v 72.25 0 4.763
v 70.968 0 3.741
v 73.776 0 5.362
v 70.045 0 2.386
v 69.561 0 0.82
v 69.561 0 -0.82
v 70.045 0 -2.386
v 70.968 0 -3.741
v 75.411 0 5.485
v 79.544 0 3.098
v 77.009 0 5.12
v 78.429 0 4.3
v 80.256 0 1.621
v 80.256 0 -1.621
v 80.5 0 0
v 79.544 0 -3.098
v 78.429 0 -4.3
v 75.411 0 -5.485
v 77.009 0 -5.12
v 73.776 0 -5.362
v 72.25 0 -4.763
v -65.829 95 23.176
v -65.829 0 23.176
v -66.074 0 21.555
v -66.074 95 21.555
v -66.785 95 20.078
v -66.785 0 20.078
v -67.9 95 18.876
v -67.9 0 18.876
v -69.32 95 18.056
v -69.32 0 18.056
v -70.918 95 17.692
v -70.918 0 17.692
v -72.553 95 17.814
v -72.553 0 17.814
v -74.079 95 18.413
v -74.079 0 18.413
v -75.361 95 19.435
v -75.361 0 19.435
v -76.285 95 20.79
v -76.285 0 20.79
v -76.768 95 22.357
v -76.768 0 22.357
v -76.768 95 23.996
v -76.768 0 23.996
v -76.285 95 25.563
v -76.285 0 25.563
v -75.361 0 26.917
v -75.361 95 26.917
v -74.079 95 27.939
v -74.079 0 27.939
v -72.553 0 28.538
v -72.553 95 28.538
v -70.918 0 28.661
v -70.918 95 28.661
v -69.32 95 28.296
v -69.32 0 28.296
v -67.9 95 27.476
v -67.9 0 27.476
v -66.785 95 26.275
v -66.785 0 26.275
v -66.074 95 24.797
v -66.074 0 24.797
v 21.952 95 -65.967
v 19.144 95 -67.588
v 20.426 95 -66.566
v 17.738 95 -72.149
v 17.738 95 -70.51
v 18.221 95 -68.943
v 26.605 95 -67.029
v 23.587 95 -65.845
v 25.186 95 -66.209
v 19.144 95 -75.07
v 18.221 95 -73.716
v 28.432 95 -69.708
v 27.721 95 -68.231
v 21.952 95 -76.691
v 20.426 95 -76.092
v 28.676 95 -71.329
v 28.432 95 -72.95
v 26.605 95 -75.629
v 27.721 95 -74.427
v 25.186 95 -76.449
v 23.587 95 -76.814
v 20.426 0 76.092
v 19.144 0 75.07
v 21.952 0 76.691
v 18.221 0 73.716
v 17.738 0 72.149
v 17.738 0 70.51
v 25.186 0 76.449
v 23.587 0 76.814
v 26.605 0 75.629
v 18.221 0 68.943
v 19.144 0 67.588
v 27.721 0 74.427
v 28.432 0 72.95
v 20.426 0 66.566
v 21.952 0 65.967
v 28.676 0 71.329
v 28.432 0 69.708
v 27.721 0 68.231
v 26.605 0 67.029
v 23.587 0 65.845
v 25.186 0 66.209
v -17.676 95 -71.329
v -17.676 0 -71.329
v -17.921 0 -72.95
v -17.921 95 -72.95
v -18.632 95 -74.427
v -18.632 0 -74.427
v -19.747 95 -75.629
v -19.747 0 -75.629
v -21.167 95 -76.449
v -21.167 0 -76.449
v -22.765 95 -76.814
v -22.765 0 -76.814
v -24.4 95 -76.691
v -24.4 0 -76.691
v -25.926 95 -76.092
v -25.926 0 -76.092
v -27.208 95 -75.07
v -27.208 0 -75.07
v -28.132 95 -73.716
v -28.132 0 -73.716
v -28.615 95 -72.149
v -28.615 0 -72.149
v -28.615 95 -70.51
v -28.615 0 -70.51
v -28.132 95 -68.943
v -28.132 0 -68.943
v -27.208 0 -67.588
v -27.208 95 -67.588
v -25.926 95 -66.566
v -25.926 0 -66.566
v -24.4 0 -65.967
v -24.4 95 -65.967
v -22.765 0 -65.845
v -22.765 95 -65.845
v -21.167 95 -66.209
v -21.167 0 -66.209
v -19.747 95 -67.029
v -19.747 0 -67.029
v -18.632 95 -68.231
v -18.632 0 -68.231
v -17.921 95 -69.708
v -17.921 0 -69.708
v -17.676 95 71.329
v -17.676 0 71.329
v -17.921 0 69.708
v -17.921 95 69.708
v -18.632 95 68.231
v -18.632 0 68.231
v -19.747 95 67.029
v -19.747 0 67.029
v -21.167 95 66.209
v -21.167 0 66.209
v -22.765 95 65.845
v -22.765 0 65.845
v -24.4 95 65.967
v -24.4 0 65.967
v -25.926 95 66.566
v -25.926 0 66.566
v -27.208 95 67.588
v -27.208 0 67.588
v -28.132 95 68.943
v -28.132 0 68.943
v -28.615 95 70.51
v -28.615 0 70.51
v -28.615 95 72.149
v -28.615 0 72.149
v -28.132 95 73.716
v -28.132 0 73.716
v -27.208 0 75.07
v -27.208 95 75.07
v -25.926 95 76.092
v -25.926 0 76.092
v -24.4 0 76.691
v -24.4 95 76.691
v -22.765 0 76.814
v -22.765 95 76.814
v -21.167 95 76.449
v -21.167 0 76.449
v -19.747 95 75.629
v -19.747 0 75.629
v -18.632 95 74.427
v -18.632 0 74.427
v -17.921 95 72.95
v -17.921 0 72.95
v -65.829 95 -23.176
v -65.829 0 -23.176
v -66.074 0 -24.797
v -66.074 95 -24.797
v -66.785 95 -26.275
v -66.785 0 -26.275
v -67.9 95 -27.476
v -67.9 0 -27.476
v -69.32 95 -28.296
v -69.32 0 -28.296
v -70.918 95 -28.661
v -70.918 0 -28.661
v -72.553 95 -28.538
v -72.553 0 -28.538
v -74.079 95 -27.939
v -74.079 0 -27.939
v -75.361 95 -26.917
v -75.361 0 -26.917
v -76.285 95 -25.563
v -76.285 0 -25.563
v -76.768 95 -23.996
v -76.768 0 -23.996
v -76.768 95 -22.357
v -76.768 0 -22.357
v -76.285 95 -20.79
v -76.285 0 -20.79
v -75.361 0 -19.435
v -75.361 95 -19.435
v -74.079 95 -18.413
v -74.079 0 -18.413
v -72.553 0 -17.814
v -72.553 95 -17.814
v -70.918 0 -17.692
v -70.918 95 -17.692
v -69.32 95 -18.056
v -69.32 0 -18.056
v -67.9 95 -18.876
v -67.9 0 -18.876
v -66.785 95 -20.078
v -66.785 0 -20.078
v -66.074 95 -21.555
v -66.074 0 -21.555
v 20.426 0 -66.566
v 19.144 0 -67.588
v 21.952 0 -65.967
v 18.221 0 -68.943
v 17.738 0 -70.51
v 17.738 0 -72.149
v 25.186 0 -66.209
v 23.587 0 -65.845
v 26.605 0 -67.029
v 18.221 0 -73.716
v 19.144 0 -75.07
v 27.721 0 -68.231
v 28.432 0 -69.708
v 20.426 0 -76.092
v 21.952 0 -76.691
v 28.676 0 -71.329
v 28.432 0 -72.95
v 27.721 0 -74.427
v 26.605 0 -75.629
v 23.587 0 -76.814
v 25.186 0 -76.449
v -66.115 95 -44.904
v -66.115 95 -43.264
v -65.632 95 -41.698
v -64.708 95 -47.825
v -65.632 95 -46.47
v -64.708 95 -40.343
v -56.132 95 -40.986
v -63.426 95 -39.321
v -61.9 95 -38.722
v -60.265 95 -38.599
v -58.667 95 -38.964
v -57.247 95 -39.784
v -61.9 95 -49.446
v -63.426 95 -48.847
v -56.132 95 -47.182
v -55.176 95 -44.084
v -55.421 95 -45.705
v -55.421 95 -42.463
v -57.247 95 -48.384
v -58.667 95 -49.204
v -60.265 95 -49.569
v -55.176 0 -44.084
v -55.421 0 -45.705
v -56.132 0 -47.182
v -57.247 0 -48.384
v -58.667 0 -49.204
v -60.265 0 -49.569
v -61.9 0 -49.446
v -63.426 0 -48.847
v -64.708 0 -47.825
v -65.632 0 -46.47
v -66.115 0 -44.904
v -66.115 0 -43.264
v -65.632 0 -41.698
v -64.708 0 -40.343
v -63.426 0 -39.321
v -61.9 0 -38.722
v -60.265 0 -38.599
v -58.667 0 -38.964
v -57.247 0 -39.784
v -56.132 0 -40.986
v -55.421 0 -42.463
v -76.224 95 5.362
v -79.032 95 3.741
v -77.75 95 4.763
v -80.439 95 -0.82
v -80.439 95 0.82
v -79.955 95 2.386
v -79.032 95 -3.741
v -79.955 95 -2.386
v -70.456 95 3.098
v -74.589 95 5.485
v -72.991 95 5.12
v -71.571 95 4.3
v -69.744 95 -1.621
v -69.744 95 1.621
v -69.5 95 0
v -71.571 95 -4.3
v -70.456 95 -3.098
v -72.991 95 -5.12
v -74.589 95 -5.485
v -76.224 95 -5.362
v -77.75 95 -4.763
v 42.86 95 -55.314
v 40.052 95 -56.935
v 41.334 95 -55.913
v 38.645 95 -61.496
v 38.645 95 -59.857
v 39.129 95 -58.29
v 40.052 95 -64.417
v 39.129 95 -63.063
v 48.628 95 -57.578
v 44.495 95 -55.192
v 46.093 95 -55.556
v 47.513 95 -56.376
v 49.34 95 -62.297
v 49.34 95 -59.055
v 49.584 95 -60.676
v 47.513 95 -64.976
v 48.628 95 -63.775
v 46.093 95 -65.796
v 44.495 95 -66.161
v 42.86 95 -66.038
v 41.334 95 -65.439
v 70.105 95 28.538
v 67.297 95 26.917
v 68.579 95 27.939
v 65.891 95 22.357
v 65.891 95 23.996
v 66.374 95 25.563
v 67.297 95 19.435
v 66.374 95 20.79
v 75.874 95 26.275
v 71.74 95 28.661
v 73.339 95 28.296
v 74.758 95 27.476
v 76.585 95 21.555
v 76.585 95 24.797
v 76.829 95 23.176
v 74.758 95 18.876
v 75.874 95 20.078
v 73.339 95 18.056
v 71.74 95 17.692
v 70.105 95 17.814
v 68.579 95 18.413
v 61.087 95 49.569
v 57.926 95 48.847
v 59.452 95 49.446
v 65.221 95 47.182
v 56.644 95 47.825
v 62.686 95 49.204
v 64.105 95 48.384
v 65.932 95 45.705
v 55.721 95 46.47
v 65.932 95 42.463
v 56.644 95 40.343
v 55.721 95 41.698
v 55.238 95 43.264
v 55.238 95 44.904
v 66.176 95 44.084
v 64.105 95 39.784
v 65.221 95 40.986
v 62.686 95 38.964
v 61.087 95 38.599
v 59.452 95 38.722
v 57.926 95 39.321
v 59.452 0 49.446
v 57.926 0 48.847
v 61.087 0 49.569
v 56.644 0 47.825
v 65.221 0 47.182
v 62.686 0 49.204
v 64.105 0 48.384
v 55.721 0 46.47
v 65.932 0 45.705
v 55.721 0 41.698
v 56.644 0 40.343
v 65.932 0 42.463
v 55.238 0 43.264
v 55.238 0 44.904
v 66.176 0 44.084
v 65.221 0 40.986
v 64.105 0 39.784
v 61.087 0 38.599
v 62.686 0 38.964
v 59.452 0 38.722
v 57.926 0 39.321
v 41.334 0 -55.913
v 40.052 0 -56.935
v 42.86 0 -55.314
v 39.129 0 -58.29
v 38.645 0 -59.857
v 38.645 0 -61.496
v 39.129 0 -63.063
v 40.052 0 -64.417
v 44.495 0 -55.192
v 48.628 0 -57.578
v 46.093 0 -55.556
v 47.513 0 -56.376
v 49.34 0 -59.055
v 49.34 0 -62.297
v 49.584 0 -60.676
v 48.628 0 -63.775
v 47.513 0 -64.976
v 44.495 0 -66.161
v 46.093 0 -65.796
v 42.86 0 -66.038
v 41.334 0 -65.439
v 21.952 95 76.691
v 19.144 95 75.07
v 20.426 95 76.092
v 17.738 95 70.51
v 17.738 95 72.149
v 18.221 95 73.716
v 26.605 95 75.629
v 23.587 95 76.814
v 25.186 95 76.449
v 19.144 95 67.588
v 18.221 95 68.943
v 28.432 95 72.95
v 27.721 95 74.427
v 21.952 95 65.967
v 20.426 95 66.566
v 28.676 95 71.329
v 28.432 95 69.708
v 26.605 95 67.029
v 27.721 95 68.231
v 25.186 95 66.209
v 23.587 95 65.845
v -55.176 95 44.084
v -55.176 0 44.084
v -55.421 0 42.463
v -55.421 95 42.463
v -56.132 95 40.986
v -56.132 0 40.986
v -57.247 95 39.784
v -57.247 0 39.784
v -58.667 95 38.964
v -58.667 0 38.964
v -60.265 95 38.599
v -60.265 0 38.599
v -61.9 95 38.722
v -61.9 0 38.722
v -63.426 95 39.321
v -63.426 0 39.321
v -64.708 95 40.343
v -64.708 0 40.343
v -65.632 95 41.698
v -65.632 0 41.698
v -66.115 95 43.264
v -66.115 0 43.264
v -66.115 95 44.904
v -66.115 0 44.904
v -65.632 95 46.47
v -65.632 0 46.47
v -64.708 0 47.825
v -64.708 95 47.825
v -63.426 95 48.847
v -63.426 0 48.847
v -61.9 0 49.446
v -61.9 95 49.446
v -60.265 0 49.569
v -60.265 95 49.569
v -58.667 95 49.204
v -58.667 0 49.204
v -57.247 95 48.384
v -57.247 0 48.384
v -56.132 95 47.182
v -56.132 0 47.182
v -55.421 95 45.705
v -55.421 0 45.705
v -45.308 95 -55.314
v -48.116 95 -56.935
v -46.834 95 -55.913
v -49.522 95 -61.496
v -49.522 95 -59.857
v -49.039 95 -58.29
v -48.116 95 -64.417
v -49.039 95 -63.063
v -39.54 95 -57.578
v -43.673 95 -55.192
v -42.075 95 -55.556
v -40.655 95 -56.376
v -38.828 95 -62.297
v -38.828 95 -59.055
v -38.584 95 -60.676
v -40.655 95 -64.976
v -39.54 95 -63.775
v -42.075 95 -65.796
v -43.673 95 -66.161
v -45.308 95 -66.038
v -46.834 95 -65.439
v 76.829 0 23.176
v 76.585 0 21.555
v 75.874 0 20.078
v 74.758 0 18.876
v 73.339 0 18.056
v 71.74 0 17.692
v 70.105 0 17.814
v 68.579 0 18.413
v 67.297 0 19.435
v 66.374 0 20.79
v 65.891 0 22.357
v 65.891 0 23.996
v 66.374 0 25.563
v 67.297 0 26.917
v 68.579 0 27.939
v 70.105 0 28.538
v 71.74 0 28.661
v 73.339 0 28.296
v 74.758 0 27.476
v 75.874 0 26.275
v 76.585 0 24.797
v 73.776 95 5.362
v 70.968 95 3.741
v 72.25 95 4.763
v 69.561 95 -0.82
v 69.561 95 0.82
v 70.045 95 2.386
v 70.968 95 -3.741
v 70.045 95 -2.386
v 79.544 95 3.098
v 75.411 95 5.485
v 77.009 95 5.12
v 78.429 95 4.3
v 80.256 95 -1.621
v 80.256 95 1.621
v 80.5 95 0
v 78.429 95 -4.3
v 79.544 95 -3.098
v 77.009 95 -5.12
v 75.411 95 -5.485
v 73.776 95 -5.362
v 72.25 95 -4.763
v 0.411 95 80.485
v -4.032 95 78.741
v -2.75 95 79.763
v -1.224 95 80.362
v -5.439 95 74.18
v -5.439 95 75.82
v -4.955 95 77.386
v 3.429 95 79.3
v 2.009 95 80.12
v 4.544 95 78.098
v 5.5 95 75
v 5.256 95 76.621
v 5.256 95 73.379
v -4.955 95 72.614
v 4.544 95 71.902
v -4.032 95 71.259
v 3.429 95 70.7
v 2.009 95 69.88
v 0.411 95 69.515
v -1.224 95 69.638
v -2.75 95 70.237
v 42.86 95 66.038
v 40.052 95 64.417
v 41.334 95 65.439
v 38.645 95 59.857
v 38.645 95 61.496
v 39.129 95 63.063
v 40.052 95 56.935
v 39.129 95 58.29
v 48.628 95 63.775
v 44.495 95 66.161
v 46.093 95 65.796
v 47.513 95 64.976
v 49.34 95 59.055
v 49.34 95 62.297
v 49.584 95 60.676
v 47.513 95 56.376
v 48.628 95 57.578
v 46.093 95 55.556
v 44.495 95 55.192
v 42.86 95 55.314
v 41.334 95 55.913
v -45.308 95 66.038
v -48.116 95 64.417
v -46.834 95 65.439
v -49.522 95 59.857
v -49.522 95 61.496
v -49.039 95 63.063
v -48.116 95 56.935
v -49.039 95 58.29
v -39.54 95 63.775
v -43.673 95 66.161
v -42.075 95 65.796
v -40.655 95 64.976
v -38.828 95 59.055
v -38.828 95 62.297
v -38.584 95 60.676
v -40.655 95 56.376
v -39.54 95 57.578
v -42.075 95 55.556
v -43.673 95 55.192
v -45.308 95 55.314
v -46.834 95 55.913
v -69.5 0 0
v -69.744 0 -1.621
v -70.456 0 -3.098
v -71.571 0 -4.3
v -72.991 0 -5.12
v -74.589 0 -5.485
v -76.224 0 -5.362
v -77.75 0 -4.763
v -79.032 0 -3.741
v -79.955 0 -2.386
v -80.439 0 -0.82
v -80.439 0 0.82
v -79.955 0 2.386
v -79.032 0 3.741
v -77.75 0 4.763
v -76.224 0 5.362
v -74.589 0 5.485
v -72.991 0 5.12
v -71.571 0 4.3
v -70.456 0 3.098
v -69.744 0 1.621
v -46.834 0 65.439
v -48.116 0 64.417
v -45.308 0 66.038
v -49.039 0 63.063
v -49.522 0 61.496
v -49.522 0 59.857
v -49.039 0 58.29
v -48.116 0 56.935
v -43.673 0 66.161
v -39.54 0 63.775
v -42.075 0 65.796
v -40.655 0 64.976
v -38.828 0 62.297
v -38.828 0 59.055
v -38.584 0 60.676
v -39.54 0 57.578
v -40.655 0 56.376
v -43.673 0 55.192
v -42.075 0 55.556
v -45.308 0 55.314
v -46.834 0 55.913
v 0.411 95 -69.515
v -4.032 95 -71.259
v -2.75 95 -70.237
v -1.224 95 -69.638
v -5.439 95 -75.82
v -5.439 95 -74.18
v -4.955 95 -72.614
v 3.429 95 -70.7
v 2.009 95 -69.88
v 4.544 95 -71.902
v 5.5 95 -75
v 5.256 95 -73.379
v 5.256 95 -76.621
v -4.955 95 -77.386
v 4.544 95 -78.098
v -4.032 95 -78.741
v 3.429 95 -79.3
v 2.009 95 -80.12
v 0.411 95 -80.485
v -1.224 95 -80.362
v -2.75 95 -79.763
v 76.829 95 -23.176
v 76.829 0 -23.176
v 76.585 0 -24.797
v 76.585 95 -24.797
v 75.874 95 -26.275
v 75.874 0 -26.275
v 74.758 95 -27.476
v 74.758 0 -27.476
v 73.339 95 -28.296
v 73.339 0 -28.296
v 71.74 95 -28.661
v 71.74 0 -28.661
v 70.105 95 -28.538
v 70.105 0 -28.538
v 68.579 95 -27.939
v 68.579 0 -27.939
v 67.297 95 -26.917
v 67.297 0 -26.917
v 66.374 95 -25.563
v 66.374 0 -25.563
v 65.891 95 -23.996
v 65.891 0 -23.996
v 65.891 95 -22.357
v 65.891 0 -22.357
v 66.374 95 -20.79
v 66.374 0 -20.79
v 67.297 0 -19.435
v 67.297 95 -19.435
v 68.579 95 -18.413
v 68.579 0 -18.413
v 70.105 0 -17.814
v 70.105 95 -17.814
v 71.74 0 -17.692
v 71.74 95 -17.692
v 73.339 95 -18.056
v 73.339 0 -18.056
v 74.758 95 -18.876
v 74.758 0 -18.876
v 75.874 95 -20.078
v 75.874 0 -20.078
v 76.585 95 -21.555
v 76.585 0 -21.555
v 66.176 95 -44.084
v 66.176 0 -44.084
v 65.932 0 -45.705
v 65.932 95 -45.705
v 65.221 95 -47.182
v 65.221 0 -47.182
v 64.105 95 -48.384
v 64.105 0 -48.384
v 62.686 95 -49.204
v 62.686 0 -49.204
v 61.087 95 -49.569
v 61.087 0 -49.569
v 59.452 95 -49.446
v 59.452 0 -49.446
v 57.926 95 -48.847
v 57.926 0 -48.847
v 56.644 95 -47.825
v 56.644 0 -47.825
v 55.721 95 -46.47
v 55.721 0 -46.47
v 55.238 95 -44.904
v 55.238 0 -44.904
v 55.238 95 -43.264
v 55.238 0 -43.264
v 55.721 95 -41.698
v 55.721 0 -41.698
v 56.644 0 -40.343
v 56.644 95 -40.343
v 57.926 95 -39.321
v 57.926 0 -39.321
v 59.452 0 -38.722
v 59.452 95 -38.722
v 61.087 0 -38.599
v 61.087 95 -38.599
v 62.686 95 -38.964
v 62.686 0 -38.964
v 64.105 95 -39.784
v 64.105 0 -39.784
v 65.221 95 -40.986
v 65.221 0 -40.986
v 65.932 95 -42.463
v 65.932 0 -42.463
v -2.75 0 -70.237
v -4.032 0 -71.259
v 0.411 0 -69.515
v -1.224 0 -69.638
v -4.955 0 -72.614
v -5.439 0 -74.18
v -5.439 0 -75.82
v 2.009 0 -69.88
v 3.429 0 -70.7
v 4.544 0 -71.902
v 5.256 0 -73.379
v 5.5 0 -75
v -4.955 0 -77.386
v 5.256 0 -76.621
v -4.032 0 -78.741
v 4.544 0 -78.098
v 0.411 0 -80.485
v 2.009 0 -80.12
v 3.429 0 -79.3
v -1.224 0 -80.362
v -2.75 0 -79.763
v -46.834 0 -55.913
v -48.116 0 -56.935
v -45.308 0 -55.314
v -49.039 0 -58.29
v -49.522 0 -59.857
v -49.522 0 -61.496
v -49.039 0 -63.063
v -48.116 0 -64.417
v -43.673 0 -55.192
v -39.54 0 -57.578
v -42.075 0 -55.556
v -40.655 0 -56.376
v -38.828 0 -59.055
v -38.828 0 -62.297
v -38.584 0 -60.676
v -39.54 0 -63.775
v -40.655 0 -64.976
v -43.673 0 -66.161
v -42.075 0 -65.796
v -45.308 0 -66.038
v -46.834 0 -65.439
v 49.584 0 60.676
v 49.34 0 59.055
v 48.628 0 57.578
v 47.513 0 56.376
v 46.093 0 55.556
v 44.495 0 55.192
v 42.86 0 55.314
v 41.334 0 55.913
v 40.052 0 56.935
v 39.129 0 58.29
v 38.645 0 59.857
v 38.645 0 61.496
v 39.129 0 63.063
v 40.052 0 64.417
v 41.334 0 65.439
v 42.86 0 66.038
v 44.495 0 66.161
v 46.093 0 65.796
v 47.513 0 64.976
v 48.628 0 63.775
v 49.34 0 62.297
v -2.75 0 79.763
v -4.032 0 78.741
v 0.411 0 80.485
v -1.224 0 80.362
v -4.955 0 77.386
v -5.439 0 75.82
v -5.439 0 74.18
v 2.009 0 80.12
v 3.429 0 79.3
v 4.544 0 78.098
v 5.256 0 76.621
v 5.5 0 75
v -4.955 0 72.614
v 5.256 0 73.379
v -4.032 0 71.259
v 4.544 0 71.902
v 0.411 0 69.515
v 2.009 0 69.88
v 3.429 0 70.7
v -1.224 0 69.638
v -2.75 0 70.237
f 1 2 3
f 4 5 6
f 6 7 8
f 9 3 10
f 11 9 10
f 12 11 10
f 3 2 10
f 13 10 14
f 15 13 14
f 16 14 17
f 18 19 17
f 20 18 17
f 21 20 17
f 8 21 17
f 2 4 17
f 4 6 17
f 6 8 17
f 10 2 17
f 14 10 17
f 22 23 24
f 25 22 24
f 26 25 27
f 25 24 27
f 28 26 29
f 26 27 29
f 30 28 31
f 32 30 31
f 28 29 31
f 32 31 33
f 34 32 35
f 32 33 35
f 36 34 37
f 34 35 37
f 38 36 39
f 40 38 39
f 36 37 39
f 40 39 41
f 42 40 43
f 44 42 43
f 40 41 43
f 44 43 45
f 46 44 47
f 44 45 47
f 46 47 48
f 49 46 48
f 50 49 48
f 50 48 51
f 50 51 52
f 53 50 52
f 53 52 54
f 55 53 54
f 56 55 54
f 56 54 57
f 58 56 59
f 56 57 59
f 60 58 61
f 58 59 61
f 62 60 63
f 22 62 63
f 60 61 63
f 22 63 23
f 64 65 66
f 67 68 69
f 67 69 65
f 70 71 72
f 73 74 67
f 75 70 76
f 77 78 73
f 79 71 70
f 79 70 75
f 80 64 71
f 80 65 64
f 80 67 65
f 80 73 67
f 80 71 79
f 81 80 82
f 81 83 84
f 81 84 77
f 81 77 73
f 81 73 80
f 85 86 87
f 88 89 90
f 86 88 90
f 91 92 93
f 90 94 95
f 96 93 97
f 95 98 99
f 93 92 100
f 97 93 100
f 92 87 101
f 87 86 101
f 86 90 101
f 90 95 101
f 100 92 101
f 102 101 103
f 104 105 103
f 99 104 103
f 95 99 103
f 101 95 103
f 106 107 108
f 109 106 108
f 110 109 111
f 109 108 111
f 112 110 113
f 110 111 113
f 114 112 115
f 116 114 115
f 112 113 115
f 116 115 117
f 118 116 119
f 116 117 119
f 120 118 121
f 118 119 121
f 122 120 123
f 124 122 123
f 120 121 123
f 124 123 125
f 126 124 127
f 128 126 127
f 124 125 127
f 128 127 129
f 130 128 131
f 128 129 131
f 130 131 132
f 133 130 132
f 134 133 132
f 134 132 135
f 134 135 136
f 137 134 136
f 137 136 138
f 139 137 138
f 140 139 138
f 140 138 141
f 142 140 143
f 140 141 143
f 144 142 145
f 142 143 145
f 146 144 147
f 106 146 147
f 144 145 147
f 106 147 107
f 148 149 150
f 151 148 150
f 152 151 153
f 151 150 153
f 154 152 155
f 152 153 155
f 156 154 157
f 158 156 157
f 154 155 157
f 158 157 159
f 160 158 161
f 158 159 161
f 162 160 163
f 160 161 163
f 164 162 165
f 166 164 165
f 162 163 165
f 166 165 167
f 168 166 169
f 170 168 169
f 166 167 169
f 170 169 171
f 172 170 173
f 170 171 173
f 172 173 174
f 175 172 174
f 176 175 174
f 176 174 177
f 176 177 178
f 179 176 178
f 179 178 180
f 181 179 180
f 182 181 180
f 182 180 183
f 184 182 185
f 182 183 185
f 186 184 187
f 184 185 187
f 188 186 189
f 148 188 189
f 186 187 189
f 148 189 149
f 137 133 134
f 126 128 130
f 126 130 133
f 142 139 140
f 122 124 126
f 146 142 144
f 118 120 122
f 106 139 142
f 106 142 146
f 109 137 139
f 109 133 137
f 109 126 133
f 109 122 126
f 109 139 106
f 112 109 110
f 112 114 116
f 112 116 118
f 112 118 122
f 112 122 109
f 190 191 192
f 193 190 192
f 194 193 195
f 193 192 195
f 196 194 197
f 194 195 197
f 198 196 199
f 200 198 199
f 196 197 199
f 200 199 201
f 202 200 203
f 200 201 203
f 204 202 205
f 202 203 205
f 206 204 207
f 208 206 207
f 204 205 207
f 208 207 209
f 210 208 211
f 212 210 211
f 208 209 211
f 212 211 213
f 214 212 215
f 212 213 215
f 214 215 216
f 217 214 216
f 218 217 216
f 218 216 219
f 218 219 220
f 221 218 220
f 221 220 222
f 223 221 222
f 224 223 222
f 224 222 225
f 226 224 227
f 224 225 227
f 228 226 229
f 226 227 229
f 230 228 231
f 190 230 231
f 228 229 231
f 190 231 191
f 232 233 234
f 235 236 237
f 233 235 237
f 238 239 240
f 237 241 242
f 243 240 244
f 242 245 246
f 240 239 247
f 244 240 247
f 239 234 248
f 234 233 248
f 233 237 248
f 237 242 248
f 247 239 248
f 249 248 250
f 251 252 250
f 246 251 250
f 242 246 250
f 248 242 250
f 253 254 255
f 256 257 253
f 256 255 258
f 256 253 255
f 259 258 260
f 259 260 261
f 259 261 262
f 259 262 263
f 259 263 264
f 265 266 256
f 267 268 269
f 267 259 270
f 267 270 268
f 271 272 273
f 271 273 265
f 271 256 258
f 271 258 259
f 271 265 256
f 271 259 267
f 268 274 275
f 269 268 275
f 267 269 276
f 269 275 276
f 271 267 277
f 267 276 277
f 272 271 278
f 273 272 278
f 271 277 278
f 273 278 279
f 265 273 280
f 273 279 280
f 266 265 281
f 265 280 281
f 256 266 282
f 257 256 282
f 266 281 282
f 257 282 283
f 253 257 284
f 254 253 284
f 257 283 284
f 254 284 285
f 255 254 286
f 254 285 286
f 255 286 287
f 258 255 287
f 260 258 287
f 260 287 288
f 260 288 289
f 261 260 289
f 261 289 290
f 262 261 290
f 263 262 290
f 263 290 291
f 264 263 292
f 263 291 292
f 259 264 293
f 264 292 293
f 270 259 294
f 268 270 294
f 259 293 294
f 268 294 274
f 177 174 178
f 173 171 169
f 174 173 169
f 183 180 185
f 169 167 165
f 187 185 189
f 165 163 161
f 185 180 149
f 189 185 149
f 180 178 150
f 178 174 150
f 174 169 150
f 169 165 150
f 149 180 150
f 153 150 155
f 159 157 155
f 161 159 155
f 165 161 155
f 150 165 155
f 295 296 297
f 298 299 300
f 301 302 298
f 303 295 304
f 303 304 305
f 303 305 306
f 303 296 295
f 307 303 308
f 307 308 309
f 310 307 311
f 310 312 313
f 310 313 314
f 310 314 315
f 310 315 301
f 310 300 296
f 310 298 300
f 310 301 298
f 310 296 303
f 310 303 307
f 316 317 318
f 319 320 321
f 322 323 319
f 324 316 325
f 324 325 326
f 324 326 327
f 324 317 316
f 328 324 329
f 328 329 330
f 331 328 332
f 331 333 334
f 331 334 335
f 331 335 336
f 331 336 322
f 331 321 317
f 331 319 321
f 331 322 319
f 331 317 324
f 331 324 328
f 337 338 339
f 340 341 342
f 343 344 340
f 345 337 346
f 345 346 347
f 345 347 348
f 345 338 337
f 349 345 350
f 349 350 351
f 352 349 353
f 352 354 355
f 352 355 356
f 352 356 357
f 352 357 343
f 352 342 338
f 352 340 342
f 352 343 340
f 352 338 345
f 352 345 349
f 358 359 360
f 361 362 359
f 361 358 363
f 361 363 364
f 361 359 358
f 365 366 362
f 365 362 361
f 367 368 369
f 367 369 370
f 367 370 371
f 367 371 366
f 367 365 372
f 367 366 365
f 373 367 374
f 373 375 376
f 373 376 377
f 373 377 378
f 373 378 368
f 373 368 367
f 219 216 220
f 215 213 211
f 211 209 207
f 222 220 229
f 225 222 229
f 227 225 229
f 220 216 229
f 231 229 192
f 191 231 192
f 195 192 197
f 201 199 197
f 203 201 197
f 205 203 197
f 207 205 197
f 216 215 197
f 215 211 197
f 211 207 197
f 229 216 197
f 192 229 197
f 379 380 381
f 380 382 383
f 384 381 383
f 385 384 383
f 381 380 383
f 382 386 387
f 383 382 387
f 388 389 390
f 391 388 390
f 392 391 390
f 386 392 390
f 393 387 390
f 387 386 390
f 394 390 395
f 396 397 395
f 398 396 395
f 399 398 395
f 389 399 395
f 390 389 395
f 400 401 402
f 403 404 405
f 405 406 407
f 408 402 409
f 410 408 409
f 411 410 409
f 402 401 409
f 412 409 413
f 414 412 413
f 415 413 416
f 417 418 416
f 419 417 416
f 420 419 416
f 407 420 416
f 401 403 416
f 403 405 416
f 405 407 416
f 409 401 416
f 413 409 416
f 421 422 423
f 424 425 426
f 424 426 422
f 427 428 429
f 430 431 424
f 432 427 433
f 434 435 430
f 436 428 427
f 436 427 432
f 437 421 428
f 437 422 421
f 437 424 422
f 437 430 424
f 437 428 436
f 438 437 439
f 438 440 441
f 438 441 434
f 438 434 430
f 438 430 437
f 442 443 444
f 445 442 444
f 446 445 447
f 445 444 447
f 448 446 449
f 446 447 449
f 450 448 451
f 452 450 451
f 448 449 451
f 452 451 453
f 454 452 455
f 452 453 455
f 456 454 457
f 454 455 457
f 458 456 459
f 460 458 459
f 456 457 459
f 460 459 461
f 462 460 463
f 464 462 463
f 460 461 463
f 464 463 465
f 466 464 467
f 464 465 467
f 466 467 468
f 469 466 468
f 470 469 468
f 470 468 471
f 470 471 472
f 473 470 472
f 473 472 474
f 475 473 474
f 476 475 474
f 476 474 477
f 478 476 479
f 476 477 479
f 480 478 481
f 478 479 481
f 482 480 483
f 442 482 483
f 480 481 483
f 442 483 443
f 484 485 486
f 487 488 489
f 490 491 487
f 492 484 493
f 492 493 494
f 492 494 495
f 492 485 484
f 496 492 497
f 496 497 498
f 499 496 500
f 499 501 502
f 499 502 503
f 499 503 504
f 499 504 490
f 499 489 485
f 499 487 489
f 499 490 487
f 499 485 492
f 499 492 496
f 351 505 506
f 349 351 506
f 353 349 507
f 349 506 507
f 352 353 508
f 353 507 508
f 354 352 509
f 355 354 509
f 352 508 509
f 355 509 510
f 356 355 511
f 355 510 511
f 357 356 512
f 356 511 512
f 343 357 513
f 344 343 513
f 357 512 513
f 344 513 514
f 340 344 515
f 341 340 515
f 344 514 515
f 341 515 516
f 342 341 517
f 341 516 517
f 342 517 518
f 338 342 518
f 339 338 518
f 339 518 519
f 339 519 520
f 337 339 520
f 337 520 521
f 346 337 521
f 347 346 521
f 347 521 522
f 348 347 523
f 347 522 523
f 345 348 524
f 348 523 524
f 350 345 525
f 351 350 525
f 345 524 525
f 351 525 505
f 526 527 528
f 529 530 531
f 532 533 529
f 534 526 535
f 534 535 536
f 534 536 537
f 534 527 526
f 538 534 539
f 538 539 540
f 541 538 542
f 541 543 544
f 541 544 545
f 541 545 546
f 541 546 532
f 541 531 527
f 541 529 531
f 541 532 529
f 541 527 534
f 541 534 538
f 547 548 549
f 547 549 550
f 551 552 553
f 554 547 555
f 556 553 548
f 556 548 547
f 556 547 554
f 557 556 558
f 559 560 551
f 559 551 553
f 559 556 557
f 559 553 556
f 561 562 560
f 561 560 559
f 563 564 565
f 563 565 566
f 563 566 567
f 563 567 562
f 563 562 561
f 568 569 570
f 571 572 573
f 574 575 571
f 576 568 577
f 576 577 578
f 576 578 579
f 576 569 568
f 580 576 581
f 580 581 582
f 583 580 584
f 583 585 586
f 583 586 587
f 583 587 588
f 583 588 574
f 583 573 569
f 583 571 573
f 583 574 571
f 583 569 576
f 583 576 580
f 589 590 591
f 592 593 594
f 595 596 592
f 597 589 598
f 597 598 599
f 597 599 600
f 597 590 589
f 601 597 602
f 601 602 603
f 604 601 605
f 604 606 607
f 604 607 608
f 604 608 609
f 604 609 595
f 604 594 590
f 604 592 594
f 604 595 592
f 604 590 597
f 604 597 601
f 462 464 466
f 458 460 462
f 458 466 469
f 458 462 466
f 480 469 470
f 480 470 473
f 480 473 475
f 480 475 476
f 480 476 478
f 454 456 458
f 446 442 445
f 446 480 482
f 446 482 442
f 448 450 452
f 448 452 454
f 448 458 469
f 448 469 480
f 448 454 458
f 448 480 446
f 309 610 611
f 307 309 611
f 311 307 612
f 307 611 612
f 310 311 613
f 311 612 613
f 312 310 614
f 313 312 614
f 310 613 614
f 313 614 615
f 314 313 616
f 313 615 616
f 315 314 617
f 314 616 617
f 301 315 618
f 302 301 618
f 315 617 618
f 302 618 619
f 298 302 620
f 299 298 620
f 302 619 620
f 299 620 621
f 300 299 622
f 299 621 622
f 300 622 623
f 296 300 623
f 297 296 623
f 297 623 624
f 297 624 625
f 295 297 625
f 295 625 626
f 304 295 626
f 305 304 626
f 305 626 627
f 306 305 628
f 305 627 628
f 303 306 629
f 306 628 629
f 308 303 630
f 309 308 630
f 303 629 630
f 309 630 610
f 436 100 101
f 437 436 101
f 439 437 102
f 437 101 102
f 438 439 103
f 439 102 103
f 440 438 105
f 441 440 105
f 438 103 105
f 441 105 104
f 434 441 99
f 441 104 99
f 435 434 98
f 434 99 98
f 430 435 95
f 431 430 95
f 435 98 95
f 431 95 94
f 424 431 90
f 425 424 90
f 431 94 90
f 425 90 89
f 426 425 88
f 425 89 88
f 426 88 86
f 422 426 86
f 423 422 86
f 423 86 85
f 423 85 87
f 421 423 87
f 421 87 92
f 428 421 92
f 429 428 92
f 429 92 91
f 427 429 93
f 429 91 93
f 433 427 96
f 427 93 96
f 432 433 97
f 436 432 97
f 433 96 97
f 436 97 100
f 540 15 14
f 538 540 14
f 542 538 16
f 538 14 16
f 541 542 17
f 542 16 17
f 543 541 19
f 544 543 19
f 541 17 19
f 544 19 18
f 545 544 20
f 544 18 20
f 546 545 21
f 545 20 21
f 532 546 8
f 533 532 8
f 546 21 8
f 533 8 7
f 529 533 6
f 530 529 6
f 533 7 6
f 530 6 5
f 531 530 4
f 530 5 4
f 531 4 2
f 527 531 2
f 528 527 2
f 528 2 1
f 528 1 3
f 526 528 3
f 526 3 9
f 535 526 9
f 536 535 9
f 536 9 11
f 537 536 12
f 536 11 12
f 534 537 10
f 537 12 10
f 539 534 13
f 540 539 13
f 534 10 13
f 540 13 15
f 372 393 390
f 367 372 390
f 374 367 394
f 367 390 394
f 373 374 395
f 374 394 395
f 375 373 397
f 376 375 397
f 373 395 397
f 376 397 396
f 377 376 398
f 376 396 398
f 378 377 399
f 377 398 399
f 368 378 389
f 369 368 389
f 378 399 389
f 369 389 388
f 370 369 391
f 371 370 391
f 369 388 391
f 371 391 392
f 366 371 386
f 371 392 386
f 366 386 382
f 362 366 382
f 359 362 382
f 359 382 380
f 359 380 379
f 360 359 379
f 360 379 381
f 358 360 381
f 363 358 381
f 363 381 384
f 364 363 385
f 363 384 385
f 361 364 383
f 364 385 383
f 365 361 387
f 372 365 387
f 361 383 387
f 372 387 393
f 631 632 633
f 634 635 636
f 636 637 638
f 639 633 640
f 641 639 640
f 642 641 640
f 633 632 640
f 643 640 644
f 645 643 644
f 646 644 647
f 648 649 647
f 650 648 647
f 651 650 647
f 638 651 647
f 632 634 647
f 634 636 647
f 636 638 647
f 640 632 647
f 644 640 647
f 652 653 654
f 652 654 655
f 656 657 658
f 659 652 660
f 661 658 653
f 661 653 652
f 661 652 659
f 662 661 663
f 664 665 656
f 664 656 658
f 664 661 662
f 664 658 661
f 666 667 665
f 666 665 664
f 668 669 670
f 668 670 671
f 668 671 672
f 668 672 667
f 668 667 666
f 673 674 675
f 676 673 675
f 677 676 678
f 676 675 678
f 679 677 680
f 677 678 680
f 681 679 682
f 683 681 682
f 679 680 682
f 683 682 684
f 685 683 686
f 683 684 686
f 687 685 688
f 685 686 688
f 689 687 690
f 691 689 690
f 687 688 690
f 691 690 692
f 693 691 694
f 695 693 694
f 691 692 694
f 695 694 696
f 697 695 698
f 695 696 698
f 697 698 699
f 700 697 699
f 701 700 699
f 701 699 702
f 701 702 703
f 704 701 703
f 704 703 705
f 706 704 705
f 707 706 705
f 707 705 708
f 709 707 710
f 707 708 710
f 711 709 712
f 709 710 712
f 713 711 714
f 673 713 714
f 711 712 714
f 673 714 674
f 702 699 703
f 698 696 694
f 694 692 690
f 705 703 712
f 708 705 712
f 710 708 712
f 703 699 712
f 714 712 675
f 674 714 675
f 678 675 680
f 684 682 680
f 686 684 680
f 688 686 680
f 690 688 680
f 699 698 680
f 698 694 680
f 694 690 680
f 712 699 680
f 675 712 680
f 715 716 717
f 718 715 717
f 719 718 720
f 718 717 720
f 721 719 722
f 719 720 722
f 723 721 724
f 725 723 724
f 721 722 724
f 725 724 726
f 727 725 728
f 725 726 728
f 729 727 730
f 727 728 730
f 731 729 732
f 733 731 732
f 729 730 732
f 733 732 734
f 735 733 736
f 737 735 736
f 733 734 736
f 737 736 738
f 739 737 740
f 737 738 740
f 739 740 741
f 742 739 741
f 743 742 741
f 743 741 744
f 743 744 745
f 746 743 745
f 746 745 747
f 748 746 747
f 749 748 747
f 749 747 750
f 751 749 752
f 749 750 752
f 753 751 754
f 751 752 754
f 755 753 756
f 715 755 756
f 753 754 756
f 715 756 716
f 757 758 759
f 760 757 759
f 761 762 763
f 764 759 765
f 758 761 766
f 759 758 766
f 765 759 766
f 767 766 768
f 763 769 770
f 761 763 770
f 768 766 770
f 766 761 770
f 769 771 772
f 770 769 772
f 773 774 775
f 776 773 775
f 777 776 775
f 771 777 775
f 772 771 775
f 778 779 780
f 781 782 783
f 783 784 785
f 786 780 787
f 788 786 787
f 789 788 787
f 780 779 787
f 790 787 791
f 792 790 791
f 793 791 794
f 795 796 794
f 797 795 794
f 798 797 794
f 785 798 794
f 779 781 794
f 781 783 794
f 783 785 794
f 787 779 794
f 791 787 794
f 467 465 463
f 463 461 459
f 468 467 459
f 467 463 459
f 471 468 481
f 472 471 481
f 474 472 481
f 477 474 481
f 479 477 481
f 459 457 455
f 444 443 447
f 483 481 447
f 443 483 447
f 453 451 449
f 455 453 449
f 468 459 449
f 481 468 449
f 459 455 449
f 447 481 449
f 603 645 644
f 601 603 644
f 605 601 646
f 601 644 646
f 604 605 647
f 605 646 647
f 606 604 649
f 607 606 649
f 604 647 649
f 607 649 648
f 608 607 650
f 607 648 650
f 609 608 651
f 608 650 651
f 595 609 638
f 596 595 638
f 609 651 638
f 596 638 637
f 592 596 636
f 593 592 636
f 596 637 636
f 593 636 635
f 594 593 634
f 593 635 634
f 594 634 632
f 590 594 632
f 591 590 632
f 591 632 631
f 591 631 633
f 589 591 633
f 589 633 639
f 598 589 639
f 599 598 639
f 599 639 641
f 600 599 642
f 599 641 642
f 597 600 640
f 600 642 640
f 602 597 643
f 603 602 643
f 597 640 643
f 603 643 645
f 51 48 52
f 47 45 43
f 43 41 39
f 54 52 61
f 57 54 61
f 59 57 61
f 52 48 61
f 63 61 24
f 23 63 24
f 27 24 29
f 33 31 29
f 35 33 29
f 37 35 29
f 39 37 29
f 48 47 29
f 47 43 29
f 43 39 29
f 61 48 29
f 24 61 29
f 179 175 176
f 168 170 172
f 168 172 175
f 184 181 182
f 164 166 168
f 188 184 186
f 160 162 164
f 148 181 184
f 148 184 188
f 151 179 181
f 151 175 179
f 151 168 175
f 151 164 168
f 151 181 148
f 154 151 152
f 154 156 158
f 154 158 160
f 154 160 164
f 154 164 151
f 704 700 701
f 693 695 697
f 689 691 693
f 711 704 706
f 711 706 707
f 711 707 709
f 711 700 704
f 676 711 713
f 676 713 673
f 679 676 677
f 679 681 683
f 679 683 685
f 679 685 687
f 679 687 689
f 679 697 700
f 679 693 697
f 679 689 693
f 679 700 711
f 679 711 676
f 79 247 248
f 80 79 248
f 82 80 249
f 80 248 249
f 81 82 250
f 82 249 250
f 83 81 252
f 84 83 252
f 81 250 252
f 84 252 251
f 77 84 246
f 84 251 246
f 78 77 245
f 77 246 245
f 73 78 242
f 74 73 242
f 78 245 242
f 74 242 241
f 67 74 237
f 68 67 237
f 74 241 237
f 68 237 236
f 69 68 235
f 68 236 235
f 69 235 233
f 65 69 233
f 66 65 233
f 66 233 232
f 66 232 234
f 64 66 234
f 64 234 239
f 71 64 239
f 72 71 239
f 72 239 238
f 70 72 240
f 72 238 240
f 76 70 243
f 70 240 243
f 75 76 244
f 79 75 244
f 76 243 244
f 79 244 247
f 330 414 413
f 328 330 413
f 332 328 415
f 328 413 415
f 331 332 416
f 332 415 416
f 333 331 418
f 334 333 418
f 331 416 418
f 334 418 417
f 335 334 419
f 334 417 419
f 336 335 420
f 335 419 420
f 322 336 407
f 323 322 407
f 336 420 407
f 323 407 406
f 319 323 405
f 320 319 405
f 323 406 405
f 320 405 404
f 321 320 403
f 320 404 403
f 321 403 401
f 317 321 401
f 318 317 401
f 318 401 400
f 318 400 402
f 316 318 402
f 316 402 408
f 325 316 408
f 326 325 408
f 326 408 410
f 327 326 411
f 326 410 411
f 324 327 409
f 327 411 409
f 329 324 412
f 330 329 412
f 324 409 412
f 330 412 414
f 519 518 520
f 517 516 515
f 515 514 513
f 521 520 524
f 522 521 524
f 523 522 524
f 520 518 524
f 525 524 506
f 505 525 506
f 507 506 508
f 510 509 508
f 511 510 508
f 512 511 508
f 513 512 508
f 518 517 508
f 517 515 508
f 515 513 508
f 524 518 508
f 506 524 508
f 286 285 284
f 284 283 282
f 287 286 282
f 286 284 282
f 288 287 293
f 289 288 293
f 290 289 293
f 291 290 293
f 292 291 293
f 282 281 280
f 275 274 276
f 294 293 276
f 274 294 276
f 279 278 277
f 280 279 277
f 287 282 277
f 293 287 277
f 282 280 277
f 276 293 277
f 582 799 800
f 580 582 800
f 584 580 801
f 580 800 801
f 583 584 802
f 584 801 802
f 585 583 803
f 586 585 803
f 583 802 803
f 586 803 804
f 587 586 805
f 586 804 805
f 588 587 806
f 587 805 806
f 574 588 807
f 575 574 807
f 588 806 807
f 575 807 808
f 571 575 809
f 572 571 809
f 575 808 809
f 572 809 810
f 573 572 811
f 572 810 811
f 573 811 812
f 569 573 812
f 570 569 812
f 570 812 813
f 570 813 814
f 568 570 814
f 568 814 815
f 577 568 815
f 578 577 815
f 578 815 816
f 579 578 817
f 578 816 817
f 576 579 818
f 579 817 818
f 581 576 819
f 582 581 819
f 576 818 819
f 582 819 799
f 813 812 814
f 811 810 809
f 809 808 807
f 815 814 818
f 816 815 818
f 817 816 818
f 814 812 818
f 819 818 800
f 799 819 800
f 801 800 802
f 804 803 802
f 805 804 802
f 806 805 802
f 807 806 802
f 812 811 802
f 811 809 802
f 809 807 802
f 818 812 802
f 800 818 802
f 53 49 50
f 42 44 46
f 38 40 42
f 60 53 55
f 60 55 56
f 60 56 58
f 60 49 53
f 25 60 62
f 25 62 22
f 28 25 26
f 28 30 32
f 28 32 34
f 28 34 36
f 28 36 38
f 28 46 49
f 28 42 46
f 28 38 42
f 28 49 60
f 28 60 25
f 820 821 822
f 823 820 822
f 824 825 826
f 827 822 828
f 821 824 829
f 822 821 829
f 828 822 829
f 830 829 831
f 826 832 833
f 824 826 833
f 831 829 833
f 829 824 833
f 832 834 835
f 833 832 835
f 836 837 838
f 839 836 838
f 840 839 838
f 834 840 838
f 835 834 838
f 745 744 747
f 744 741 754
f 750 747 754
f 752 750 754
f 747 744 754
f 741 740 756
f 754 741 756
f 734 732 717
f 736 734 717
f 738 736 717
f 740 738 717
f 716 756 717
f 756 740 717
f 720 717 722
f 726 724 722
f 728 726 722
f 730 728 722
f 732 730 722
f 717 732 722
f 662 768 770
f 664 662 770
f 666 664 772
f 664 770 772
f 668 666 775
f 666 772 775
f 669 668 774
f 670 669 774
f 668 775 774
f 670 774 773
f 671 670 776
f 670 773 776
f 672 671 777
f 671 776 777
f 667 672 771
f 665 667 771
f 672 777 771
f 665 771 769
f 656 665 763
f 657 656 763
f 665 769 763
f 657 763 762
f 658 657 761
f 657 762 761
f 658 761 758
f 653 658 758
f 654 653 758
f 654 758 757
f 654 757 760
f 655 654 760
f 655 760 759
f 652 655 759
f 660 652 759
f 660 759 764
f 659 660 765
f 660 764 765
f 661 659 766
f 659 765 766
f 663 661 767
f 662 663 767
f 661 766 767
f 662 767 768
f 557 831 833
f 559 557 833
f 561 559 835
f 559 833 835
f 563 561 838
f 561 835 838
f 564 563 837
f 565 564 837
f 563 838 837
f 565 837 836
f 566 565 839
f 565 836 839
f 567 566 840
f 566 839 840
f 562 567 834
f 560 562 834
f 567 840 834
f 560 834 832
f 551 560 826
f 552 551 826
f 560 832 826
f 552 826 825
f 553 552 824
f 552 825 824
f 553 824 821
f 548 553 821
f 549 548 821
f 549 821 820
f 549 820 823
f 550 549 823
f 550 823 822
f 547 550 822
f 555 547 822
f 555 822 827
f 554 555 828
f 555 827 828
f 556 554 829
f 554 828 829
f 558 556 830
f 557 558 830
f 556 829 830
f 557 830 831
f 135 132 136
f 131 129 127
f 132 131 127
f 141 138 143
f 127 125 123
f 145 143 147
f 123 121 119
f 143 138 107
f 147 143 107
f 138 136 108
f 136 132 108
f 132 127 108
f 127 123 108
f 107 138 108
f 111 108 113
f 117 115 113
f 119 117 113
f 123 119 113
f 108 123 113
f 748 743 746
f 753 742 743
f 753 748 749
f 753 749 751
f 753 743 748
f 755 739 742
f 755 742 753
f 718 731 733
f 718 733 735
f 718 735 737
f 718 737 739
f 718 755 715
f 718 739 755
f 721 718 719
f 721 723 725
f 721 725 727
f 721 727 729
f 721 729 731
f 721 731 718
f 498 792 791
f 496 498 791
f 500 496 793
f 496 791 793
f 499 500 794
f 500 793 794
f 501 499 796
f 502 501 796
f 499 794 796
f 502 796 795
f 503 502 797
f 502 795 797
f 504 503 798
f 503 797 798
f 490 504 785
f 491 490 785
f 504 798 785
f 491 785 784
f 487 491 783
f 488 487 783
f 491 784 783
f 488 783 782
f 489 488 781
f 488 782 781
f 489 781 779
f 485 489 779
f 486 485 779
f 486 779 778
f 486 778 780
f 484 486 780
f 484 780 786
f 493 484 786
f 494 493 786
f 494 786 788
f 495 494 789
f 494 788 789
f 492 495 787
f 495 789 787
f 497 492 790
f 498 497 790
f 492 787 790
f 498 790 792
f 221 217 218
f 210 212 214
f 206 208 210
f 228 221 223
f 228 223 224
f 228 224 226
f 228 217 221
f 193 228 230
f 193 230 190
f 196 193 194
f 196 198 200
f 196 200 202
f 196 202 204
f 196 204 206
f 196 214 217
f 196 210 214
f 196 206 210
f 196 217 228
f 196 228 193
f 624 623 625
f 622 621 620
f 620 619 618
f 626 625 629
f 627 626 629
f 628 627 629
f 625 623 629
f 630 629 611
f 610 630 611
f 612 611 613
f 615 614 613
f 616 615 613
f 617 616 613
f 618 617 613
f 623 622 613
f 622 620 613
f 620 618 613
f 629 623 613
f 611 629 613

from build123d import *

# Parameters (mm, degrees)
SKETCH1_R              = 5.5
BOSS_EXTRUDE1_DEPTH    = 95
BOSS_EXTRUDE1_2_DEPTH  = 95
BOSS_EXTRUDE1_3_DEPTH  = 95
BOSS_EXTRUDE1_4_DEPTH  = 95
BOSS_EXTRUDE1_5_DEPTH  = 95
BOSS_EXTRUDE1_6_DEPTH  = 95
BOSS_EXTRUDE1_7_DEPTH  = 95
BOSS_EXTRUDE1_8_DEPTH  = 95
BOSS_EXTRUDE1_9_DEPTH  = 95
BOSS_EXTRUDE1_10_DEPTH = 95
BOSS_EXTRUDE1_11_DEPTH = 95
BOSS_EXTRUDE1_12_DEPTH = 95
BOSS_EXTRUDE1_13_DEPTH = 95
BOSS_EXTRUDE1_14_DEPTH = 95
BOSS_EXTRUDE1_15_DEPTH = 95
BOSS_EXTRUDE1_16_DEPTH = 95
BOSS_EXTRUDE1_17_DEPTH = 95
BOSS_EXTRUDE1_18_DEPTH = 95
BOSS_EXTRUDE1_19_DEPTH = 95
BOSS_EXTRUDE1_20_DEPTH = 95


with BuildPart() as part:
    # Sketch1 → Boss-Extrude1 (new body)
    with BuildSketch(Plane(origin=(0, 0, 0), x_dir=(1, 0, 0), z_dir=(0, 1, 0))):
        with Locations((-75, 0)):
            Circle(SKETCH1_R)
    extrude(amount=BOSS_EXTRUDE1_DEPTH)


with BuildPart() as body_2:
    # Sketch1 → Boss-Extrude1 2 (new body)
    with BuildSketch(Plane(origin=(0, 0, 0), x_dir=(1, 0, 0), z_dir=(0, 1, 0))):
        with Locations((-71.329238722, 23.176274578)):
            Circle(SKETCH1_R)
    extrude(amount=BOSS_EXTRUDE1_2_DEPTH)


with BuildPart() as body_3:
    # Sketch1 → Boss-Extrude1 3 (new body)
    with BuildSketch(Plane(origin=(0, 0, 0), x_dir=(1, 0, 0), z_dir=(0, 1, 0))):
        with Locations((-60.676274578, 44.083893922)):
            Circle(SKETCH1_R)
    extrude(amount=BOSS_EXTRUDE1_3_DEPTH)


with BuildPart() as body_4:
    # Sketch1 → Boss-Extrude1 4 (new body)
    with BuildSketch(Plane(origin=(0, 0, 0), x_dir=(1, 0, 0), z_dir=(0, 1, 0))):
        with Locations((-44.083893922, 60.676274578)):
            Circle(SKETCH1_R)
    extrude(amount=BOSS_EXTRUDE1_4_DEPTH)


with BuildPart() as body_5:
    # Sketch1 → Boss-Extrude1 5 (new body)
    with BuildSketch(Plane(origin=(0, 0, 0), x_dir=(1, 0, 0), z_dir=(0, 1, 0))):
        with Locations((-23.176274578, 71.329238722)):
            Circle(SKETCH1_R)
    extrude(amount=BOSS_EXTRUDE1_5_DEPTH)


with BuildPart() as body_6:
    # Sketch1 → Boss-Extrude1 6 (new body)
    with BuildSketch(Plane(origin=(0, 0, 0), x_dir=(1, 0, 0), z_dir=(0, 1, 0))):
        with Locations((0, 75)):
            Circle(SKETCH1_R)
    extrude(amount=BOSS_EXTRUDE1_6_DEPTH)


with BuildPart() as body_7:
    # Sketch1 → Boss-Extrude1 7 (new body)
    with BuildSketch(Plane(origin=(0, 0, 0), x_dir=(1, 0, 0), z_dir=(0, 1, 0))):
        with Locations((23.176274578, 71.329238722)):
            Circle(SKETCH1_R)
    extrude(amount=BOSS_EXTRUDE1_7_DEPTH)


with BuildPart() as body_8:
    # Sketch1 → Boss-Extrude1 8 (new body)
    with BuildSketch(Plane(origin=(0, 0, 0), x_dir=(1, 0, 0), z_dir=(0, 1, 0))):
        with Locations((44.083893922, 60.676274578)):
            Circle(SKETCH1_R)
    extrude(amount=BOSS_EXTRUDE1_8_DEPTH)


with BuildPart() as body_9:
    # Sketch1 → Boss-Extrude1 9 (new body)
    with BuildSketch(Plane(origin=(0, 0, 0), x_dir=(1, 0, 0), z_dir=(0, 1, 0))):
        with Locations((60.676274578, 44.083893922)):
            Circle(SKETCH1_R)
    extrude(amount=BOSS_EXTRUDE1_9_DEPTH)


with BuildPart() as body_10:
    # Sketch1 → Boss-Extrude1 10 (new body)
    with BuildSketch(Plane(origin=(0, 0, 0), x_dir=(1, 0, 0), z_dir=(0, 1, 0))):
        with Locations((71.329238722, 23.176274578)):
            Circle(SKETCH1_R)
    extrude(amount=BOSS_EXTRUDE1_10_DEPTH)


with BuildPart() as body_11:
    # Sketch1 → Boss-Extrude1 11 (new body)
    with BuildSketch(Plane(origin=(0, 0, 0), x_dir=(1, 0, 0), z_dir=(0, 1, 0))):
        with Locations((75, 0)):
            Circle(SKETCH1_R)
    extrude(amount=BOSS_EXTRUDE1_11_DEPTH)


with BuildPart() as body_12:
    # Sketch1 → Boss-Extrude1 12 (new body)
    with BuildSketch(Plane(origin=(0, 0, 0), x_dir=(1, 0, 0), z_dir=(0, 1, 0))):
        with Locations((71.329238722, -23.176274578)):
            Circle(SKETCH1_R)
    extrude(amount=BOSS_EXTRUDE1_12_DEPTH)


with BuildPart() as body_13:
    # Sketch1 → Boss-Extrude1 13 (new body)
    with BuildSketch(Plane(origin=(0, 0, 0), x_dir=(1, 0, 0), z_dir=(0, 1, 0))):
        with Locations((60.676274578, -44.083893922)):
            Circle(SKETCH1_R)
    extrude(amount=BOSS_EXTRUDE1_13_DEPTH)


with BuildPart() as body_14:
    # Sketch1 → Boss-Extrude1 14 (new body)
    with BuildSketch(Plane(origin=(0, 0, 0), x_dir=(1, 0, 0), z_dir=(0, 1, 0))):
        with Locations((44.083893922, -60.676274578)):
            Circle(SKETCH1_R)
    extrude(amount=BOSS_EXTRUDE1_14_DEPTH)


with BuildPart() as body_15:
    # Sketch1 → Boss-Extrude1 15 (new body)
    with BuildSketch(Plane(origin=(0, 0, 0), x_dir=(1, 0, 0), z_dir=(0, 1, 0))):
        with Locations((23.176274578, -71.329238722)):
            Circle(SKETCH1_R)
    extrude(amount=BOSS_EXTRUDE1_15_DEPTH)


with BuildPart() as body_16:
    # Sketch1 → Boss-Extrude1 16 (new body)
    with BuildSketch(Plane(origin=(0, 0, 0), x_dir=(1, 0, 0), z_dir=(0, 1, 0))):
        with Locations((0, -75)):
            Circle(SKETCH1_R)
    extrude(amount=BOSS_EXTRUDE1_16_DEPTH)


with BuildPart() as body_17:
    # Sketch1 → Boss-Extrude1 17 (new body)
    with BuildSketch(Plane(origin=(0, 0, 0), x_dir=(1, 0, 0), z_dir=(0, 1, 0))):
        with Locations((-23.176274578, -71.329238722)):
            Circle(SKETCH1_R)
    extrude(amount=BOSS_EXTRUDE1_17_DEPTH)


with BuildPart() as body_18:
    # Sketch1 → Boss-Extrude1 18 (new body)
    with BuildSketch(Plane(origin=(0, 0, 0), x_dir=(1, 0, 0), z_dir=(0, 1, 0))):
        with Locations((-44.083893922, -60.676274578)):
            Circle(SKETCH1_R)
    extrude(amount=BOSS_EXTRUDE1_18_DEPTH)


with BuildPart() as body_19:
    # Sketch1 → Boss-Extrude1 19 (new body)
    with BuildSketch(Plane(origin=(0, 0, 0), x_dir=(1, 0, 0), z_dir=(0, 1, 0))):
        with Locations((-60.676274578, -44.083893922)):
            Circle(SKETCH1_R)
    extrude(amount=BOSS_EXTRUDE1_19_DEPTH)


with BuildPart() as body_20:
    # Sketch1 → Boss-Extrude1 20 (new body)
    with BuildSketch(Plane(origin=(0, 0, 0), x_dir=(1, 0, 0), z_dir=(0, 1, 0))):
        with Locations((-71.329238722, -23.176274578)):
            Circle(SKETCH1_R)
    extrude(amount=BOSS_EXTRUDE1_20_DEPTH)


solid = Compound([part.part, body_2.part, body_3.part, body_4.part, body_5.part, body_6.part, body_7.part, body_8.part, body_9.part, body_10.part, body_11.part, body_12.part, body_13.part, body_14.part, body_15.part, body_16.part, body_17.part, body_18.part, body_19.part, body_20.part])
